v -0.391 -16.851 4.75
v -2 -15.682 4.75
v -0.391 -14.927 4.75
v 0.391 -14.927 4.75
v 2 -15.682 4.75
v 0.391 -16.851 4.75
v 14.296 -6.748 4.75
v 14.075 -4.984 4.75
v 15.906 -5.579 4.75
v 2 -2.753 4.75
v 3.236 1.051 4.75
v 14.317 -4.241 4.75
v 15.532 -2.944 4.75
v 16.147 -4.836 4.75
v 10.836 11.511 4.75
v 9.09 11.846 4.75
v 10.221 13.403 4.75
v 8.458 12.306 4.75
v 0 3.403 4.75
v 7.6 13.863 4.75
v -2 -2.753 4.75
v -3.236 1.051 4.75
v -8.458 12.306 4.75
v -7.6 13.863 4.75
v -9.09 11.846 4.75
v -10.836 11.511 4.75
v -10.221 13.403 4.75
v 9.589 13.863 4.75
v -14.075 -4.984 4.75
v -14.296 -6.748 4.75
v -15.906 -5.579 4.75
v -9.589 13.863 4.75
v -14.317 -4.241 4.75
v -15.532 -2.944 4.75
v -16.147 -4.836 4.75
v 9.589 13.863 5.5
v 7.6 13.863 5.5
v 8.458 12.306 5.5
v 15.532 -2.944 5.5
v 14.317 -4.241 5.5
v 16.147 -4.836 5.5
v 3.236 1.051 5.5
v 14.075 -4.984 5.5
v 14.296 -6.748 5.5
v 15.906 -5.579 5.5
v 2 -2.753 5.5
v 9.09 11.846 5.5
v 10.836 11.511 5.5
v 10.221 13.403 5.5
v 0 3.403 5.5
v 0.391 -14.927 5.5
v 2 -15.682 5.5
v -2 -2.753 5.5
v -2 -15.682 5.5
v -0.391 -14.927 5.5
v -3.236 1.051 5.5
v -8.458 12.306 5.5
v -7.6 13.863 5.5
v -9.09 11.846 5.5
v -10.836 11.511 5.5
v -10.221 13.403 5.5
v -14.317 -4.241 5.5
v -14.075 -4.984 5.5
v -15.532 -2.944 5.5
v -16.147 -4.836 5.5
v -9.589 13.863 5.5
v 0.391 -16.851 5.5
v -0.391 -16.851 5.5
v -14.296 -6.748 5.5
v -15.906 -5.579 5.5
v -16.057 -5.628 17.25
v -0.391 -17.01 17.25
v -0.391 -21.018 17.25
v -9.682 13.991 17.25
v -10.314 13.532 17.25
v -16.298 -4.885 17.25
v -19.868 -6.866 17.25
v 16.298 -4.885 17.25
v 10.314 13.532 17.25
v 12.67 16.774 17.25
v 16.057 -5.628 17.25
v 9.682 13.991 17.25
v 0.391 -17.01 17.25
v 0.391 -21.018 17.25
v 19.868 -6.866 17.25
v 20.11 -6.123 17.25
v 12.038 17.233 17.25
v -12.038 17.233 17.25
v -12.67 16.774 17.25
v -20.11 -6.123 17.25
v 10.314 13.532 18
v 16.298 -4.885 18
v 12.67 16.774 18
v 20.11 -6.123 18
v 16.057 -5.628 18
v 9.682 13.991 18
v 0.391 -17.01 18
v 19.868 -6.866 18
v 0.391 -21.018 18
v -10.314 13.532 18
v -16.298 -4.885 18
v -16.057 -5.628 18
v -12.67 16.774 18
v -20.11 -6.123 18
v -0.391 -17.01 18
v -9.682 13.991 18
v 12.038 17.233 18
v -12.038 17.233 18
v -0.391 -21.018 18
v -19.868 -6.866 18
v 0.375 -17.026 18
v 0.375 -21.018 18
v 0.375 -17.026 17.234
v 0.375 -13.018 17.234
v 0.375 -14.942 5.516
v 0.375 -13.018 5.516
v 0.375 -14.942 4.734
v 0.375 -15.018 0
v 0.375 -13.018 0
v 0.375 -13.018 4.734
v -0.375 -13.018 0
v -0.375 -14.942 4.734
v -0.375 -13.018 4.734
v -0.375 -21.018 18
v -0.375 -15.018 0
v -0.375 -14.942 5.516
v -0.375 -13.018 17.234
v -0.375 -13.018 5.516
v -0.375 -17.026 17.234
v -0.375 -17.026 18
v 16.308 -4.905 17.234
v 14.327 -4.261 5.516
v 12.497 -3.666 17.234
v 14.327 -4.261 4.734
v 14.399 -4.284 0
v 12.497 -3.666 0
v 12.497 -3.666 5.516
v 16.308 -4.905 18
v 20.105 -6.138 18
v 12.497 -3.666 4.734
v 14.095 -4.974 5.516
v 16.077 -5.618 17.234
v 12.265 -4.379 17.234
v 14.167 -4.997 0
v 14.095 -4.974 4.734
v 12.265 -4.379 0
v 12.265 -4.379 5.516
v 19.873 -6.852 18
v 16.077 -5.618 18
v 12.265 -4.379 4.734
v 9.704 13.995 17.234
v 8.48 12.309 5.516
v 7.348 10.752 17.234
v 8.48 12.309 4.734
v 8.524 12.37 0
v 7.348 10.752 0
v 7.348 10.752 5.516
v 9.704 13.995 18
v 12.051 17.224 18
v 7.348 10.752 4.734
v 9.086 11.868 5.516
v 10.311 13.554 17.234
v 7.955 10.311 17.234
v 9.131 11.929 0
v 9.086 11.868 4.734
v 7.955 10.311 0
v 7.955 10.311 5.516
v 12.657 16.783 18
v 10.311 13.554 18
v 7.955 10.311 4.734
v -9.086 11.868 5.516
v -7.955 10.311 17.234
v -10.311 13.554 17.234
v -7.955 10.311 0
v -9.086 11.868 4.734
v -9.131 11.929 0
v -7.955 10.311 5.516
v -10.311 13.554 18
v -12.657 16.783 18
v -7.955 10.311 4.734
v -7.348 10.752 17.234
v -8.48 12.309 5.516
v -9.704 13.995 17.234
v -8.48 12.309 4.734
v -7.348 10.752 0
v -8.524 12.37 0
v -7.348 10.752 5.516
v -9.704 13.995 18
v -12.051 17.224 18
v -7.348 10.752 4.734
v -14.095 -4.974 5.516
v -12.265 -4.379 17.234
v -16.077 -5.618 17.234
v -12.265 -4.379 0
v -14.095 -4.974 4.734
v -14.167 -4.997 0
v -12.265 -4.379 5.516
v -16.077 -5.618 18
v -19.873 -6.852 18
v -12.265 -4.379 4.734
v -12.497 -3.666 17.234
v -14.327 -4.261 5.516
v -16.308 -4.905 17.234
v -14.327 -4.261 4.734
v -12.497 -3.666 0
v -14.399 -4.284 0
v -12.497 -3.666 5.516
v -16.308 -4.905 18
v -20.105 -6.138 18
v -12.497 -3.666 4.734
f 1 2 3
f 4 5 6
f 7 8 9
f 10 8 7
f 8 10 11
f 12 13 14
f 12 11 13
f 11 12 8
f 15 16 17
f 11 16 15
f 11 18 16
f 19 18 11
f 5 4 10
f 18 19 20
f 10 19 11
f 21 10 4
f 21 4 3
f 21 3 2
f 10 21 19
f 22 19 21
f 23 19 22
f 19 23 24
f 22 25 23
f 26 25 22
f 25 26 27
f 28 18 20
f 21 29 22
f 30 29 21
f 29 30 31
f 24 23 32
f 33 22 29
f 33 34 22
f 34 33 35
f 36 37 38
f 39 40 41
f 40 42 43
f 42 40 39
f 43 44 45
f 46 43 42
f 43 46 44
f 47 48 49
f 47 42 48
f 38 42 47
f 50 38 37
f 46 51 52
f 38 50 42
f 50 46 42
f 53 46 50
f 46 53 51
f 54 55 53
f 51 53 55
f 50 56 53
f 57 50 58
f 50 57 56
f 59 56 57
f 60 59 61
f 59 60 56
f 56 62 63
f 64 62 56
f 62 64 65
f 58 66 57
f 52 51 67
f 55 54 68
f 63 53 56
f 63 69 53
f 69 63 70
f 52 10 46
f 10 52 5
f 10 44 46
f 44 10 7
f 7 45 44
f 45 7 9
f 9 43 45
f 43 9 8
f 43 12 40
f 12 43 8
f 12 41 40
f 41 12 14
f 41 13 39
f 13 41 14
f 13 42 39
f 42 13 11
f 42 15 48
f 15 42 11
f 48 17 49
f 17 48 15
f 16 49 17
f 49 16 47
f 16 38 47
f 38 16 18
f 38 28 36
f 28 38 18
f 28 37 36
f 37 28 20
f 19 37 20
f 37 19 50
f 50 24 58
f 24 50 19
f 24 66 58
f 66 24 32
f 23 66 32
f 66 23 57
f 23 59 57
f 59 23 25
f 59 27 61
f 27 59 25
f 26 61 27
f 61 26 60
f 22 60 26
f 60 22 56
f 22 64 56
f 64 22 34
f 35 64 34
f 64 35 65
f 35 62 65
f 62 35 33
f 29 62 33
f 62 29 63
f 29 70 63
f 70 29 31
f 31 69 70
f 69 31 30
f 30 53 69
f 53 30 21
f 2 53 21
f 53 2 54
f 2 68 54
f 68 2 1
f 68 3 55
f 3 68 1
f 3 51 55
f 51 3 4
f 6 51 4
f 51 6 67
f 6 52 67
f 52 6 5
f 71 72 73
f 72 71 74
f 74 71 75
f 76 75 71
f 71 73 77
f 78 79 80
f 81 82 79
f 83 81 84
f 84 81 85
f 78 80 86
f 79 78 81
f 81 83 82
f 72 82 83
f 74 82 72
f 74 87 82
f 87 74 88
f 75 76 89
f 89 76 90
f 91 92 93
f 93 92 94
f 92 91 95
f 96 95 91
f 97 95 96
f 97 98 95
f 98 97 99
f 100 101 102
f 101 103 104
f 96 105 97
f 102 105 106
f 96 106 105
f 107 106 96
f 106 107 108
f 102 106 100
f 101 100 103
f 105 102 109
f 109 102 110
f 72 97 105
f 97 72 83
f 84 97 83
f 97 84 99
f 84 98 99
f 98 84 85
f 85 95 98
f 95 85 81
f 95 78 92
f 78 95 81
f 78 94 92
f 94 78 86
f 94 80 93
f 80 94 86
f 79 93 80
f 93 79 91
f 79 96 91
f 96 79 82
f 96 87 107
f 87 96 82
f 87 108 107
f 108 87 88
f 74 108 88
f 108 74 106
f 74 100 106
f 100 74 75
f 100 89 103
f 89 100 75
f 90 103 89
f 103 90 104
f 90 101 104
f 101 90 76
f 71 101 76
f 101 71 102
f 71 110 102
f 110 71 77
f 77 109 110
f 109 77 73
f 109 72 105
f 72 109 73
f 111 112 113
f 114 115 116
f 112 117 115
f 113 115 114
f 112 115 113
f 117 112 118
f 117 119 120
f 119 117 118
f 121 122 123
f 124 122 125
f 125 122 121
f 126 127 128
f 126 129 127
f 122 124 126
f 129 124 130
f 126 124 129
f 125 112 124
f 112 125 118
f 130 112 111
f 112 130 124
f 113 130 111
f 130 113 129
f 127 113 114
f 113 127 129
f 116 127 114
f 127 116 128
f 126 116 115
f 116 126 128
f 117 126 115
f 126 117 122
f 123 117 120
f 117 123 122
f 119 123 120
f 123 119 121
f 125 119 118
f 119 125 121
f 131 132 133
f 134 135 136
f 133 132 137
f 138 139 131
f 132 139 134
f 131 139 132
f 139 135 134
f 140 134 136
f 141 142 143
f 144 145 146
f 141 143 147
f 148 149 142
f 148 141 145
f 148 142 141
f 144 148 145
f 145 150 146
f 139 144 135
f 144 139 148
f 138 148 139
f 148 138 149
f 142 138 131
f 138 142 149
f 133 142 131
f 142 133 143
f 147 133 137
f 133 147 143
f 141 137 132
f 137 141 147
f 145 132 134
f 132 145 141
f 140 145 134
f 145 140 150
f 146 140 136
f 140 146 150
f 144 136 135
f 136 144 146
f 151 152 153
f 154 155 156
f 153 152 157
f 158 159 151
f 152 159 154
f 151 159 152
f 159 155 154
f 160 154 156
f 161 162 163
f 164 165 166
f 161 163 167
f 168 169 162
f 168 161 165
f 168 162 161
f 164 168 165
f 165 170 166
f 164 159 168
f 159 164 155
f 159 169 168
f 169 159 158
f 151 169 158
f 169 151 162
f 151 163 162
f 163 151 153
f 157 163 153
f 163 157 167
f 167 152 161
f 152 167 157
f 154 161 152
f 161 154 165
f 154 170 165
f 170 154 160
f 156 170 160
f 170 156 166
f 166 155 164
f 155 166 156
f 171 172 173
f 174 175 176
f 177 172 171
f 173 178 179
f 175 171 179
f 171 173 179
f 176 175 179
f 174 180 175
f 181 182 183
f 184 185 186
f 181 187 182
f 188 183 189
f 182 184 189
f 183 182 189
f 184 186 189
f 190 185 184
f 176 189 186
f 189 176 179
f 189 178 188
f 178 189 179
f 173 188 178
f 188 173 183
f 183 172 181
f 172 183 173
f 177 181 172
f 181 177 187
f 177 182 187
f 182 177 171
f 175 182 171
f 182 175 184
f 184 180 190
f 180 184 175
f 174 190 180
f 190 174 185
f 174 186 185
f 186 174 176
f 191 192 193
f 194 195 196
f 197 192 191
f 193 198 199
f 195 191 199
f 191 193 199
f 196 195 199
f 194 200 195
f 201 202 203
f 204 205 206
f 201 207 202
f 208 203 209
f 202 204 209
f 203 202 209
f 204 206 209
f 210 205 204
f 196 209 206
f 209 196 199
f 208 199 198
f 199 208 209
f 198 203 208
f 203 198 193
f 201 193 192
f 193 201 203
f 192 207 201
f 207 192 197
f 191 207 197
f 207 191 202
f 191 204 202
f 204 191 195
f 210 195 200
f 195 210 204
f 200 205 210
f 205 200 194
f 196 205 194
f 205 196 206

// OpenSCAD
// file: ../src/functions.scad
module shelf(type, diameter,leg_width) {
    if (type == 0)
    round_shelf(diameter, leg_width);
    if (type == 1)
    square_shelf(diameter, leg_width);
    if (type == 2)
    square_shelf_leg_supports(diameter, leg_width);
}

module round_shelf(diameter,leg_width) {
    difference() {
        circle(d=diameter);
        leg_slots(diameter, leg_width);
    }
}

module square_shelf(diameter,leg_width) {
    difference() {
        hull() {
            leg_slots(diameter, leg_width);
        }
        leg_slots(diameter, leg_width);
    }
}

module square_shelf_leg_supports(diameter,leg_width) {
    intersection() {
        square_shelf(diameter, leg_width);
        for(i=[0:leg_count-1]) {
            rotate(i*360/leg_count)
            translate([-leg_support/2,-diameter/2])
            square([leg_support,diameter/2]);
        }
    }
}


module leg_slots(diameter, leg_width) {
    for(i=[0:leg_count-1]) {
        rotate(i*360/leg_count)
        translate([-leg_thick/2-gap,-diameter/2])
        square([leg_thick+gapp,leg_width]);
    }
}

module shelf_number(i) {
        shelf(shelves[i], tan(leg_angle)*((top_height-leg_height)/(shelf_count-1)*i+leg_height)*2+bottom,(tan(leg_angle)*((top_height-leg_height)/(shelf_count-1)*i+leg_height)+min_leg)/2+gap/2);
}

module assemble_shelves() {
    for(i=[0:shelf_count-1]) {
        translate([0,0,(top_height-leg_height)/(shelf_count-1)*i+leg_height-plywood])
        linear_extrude(height=plywood)
        shelf_number(i);
    }
}

module assemble_legs() {
    for(i=[0:leg_count-1]) {
        rotate(i*360/leg_count)
        translate([-leg_thick/2-plywood/2,0,0])
        for(l=[1:leg_layers]) {
            translate([plywood*l,0,0])
            leg_3d();
        }
    }
}

//shelf(bottom,min_leg);

module leg() {
    difference() {
        square([min_leg+(top-bottom)/2,top_height]);
        translate([min_leg,0])
        rotate(-leg_angle)
        square([min_leg+(top-bottom),top_height*2]);
        for(i=[0:shelf_count-1]) {
            translate([0,(top_height-leg_height)/(shelf_count-1)*i+leg_height-plywood-gap])
            square([(tan(leg_angle)*((top_height-leg_height)/(shelf_count-1)*i+leg_height)+min_leg)/2+gap/2,plywood+gapp]);
        }
            
    }
}

module leg_3d() {
    translate([0,-bottom/2+min_leg,0])
    rotate([90,0,-90])
    translate([0,0,-plywood/2])
    color("lime")
    linear_extrude(height=plywood)
    leg();
}

module assemble() {
    assemble_shelves();
    assemble_legs();
}

module plate() {
    for(i=[0:leg_count/2-1]) {
        translate([i*((top-bottom)/2+min_leg*2+tree*2),0]) {
            leg();
            translate([min_leg+(top-bottom)/2+tree+min_leg,top_height])
            rotate(180)
            leg();
        }
    }
    if(leg_count%2 != 0) {
            translate([floor(leg_count/2)*((top-bottom)/2+min_leg*2+tree*2),0])
            leg();
    }
    translate([0,-top/2-tree])
    for(i=[0:shelf_count-1]) {
        //too much math, I can drag in inkscape
        translate([top*i,0])
        shelf_number(i);
    }
}
// main file
include <../src/functions.scad>;

square_top=30;
shelves = [2, 1];
// 0 = round
// 1 = square
// 2 = leg_supports (square)
shelf_count = len(shelves);
leg_layers=1;
leg_count = 5;
leg_height = 5.5; // bottom shelf
top_height = 18; //top to ground
min_leg = 2; //smallest size a leg can be
plywood = 0.75;
gap = 1/64;
gapp = gap*2;
pad = 0.1;
padd = pad*2;
leg_thick=plywood*leg_layers;

leg_support=4;

tree=2;

top = sqrt(2*pow((square_top/2),2))*2-leg_thick/2-gap; //diameter
max_inset=12;

bottom = top-max_inset+sin($t*360)*max_inset; //diameter
leg_angle = atan((top-bottom)/2/top_height);
echo("top is", top);

$fn=120;


// RENDER gif
module demo() {
    assemble();
}

demo();
